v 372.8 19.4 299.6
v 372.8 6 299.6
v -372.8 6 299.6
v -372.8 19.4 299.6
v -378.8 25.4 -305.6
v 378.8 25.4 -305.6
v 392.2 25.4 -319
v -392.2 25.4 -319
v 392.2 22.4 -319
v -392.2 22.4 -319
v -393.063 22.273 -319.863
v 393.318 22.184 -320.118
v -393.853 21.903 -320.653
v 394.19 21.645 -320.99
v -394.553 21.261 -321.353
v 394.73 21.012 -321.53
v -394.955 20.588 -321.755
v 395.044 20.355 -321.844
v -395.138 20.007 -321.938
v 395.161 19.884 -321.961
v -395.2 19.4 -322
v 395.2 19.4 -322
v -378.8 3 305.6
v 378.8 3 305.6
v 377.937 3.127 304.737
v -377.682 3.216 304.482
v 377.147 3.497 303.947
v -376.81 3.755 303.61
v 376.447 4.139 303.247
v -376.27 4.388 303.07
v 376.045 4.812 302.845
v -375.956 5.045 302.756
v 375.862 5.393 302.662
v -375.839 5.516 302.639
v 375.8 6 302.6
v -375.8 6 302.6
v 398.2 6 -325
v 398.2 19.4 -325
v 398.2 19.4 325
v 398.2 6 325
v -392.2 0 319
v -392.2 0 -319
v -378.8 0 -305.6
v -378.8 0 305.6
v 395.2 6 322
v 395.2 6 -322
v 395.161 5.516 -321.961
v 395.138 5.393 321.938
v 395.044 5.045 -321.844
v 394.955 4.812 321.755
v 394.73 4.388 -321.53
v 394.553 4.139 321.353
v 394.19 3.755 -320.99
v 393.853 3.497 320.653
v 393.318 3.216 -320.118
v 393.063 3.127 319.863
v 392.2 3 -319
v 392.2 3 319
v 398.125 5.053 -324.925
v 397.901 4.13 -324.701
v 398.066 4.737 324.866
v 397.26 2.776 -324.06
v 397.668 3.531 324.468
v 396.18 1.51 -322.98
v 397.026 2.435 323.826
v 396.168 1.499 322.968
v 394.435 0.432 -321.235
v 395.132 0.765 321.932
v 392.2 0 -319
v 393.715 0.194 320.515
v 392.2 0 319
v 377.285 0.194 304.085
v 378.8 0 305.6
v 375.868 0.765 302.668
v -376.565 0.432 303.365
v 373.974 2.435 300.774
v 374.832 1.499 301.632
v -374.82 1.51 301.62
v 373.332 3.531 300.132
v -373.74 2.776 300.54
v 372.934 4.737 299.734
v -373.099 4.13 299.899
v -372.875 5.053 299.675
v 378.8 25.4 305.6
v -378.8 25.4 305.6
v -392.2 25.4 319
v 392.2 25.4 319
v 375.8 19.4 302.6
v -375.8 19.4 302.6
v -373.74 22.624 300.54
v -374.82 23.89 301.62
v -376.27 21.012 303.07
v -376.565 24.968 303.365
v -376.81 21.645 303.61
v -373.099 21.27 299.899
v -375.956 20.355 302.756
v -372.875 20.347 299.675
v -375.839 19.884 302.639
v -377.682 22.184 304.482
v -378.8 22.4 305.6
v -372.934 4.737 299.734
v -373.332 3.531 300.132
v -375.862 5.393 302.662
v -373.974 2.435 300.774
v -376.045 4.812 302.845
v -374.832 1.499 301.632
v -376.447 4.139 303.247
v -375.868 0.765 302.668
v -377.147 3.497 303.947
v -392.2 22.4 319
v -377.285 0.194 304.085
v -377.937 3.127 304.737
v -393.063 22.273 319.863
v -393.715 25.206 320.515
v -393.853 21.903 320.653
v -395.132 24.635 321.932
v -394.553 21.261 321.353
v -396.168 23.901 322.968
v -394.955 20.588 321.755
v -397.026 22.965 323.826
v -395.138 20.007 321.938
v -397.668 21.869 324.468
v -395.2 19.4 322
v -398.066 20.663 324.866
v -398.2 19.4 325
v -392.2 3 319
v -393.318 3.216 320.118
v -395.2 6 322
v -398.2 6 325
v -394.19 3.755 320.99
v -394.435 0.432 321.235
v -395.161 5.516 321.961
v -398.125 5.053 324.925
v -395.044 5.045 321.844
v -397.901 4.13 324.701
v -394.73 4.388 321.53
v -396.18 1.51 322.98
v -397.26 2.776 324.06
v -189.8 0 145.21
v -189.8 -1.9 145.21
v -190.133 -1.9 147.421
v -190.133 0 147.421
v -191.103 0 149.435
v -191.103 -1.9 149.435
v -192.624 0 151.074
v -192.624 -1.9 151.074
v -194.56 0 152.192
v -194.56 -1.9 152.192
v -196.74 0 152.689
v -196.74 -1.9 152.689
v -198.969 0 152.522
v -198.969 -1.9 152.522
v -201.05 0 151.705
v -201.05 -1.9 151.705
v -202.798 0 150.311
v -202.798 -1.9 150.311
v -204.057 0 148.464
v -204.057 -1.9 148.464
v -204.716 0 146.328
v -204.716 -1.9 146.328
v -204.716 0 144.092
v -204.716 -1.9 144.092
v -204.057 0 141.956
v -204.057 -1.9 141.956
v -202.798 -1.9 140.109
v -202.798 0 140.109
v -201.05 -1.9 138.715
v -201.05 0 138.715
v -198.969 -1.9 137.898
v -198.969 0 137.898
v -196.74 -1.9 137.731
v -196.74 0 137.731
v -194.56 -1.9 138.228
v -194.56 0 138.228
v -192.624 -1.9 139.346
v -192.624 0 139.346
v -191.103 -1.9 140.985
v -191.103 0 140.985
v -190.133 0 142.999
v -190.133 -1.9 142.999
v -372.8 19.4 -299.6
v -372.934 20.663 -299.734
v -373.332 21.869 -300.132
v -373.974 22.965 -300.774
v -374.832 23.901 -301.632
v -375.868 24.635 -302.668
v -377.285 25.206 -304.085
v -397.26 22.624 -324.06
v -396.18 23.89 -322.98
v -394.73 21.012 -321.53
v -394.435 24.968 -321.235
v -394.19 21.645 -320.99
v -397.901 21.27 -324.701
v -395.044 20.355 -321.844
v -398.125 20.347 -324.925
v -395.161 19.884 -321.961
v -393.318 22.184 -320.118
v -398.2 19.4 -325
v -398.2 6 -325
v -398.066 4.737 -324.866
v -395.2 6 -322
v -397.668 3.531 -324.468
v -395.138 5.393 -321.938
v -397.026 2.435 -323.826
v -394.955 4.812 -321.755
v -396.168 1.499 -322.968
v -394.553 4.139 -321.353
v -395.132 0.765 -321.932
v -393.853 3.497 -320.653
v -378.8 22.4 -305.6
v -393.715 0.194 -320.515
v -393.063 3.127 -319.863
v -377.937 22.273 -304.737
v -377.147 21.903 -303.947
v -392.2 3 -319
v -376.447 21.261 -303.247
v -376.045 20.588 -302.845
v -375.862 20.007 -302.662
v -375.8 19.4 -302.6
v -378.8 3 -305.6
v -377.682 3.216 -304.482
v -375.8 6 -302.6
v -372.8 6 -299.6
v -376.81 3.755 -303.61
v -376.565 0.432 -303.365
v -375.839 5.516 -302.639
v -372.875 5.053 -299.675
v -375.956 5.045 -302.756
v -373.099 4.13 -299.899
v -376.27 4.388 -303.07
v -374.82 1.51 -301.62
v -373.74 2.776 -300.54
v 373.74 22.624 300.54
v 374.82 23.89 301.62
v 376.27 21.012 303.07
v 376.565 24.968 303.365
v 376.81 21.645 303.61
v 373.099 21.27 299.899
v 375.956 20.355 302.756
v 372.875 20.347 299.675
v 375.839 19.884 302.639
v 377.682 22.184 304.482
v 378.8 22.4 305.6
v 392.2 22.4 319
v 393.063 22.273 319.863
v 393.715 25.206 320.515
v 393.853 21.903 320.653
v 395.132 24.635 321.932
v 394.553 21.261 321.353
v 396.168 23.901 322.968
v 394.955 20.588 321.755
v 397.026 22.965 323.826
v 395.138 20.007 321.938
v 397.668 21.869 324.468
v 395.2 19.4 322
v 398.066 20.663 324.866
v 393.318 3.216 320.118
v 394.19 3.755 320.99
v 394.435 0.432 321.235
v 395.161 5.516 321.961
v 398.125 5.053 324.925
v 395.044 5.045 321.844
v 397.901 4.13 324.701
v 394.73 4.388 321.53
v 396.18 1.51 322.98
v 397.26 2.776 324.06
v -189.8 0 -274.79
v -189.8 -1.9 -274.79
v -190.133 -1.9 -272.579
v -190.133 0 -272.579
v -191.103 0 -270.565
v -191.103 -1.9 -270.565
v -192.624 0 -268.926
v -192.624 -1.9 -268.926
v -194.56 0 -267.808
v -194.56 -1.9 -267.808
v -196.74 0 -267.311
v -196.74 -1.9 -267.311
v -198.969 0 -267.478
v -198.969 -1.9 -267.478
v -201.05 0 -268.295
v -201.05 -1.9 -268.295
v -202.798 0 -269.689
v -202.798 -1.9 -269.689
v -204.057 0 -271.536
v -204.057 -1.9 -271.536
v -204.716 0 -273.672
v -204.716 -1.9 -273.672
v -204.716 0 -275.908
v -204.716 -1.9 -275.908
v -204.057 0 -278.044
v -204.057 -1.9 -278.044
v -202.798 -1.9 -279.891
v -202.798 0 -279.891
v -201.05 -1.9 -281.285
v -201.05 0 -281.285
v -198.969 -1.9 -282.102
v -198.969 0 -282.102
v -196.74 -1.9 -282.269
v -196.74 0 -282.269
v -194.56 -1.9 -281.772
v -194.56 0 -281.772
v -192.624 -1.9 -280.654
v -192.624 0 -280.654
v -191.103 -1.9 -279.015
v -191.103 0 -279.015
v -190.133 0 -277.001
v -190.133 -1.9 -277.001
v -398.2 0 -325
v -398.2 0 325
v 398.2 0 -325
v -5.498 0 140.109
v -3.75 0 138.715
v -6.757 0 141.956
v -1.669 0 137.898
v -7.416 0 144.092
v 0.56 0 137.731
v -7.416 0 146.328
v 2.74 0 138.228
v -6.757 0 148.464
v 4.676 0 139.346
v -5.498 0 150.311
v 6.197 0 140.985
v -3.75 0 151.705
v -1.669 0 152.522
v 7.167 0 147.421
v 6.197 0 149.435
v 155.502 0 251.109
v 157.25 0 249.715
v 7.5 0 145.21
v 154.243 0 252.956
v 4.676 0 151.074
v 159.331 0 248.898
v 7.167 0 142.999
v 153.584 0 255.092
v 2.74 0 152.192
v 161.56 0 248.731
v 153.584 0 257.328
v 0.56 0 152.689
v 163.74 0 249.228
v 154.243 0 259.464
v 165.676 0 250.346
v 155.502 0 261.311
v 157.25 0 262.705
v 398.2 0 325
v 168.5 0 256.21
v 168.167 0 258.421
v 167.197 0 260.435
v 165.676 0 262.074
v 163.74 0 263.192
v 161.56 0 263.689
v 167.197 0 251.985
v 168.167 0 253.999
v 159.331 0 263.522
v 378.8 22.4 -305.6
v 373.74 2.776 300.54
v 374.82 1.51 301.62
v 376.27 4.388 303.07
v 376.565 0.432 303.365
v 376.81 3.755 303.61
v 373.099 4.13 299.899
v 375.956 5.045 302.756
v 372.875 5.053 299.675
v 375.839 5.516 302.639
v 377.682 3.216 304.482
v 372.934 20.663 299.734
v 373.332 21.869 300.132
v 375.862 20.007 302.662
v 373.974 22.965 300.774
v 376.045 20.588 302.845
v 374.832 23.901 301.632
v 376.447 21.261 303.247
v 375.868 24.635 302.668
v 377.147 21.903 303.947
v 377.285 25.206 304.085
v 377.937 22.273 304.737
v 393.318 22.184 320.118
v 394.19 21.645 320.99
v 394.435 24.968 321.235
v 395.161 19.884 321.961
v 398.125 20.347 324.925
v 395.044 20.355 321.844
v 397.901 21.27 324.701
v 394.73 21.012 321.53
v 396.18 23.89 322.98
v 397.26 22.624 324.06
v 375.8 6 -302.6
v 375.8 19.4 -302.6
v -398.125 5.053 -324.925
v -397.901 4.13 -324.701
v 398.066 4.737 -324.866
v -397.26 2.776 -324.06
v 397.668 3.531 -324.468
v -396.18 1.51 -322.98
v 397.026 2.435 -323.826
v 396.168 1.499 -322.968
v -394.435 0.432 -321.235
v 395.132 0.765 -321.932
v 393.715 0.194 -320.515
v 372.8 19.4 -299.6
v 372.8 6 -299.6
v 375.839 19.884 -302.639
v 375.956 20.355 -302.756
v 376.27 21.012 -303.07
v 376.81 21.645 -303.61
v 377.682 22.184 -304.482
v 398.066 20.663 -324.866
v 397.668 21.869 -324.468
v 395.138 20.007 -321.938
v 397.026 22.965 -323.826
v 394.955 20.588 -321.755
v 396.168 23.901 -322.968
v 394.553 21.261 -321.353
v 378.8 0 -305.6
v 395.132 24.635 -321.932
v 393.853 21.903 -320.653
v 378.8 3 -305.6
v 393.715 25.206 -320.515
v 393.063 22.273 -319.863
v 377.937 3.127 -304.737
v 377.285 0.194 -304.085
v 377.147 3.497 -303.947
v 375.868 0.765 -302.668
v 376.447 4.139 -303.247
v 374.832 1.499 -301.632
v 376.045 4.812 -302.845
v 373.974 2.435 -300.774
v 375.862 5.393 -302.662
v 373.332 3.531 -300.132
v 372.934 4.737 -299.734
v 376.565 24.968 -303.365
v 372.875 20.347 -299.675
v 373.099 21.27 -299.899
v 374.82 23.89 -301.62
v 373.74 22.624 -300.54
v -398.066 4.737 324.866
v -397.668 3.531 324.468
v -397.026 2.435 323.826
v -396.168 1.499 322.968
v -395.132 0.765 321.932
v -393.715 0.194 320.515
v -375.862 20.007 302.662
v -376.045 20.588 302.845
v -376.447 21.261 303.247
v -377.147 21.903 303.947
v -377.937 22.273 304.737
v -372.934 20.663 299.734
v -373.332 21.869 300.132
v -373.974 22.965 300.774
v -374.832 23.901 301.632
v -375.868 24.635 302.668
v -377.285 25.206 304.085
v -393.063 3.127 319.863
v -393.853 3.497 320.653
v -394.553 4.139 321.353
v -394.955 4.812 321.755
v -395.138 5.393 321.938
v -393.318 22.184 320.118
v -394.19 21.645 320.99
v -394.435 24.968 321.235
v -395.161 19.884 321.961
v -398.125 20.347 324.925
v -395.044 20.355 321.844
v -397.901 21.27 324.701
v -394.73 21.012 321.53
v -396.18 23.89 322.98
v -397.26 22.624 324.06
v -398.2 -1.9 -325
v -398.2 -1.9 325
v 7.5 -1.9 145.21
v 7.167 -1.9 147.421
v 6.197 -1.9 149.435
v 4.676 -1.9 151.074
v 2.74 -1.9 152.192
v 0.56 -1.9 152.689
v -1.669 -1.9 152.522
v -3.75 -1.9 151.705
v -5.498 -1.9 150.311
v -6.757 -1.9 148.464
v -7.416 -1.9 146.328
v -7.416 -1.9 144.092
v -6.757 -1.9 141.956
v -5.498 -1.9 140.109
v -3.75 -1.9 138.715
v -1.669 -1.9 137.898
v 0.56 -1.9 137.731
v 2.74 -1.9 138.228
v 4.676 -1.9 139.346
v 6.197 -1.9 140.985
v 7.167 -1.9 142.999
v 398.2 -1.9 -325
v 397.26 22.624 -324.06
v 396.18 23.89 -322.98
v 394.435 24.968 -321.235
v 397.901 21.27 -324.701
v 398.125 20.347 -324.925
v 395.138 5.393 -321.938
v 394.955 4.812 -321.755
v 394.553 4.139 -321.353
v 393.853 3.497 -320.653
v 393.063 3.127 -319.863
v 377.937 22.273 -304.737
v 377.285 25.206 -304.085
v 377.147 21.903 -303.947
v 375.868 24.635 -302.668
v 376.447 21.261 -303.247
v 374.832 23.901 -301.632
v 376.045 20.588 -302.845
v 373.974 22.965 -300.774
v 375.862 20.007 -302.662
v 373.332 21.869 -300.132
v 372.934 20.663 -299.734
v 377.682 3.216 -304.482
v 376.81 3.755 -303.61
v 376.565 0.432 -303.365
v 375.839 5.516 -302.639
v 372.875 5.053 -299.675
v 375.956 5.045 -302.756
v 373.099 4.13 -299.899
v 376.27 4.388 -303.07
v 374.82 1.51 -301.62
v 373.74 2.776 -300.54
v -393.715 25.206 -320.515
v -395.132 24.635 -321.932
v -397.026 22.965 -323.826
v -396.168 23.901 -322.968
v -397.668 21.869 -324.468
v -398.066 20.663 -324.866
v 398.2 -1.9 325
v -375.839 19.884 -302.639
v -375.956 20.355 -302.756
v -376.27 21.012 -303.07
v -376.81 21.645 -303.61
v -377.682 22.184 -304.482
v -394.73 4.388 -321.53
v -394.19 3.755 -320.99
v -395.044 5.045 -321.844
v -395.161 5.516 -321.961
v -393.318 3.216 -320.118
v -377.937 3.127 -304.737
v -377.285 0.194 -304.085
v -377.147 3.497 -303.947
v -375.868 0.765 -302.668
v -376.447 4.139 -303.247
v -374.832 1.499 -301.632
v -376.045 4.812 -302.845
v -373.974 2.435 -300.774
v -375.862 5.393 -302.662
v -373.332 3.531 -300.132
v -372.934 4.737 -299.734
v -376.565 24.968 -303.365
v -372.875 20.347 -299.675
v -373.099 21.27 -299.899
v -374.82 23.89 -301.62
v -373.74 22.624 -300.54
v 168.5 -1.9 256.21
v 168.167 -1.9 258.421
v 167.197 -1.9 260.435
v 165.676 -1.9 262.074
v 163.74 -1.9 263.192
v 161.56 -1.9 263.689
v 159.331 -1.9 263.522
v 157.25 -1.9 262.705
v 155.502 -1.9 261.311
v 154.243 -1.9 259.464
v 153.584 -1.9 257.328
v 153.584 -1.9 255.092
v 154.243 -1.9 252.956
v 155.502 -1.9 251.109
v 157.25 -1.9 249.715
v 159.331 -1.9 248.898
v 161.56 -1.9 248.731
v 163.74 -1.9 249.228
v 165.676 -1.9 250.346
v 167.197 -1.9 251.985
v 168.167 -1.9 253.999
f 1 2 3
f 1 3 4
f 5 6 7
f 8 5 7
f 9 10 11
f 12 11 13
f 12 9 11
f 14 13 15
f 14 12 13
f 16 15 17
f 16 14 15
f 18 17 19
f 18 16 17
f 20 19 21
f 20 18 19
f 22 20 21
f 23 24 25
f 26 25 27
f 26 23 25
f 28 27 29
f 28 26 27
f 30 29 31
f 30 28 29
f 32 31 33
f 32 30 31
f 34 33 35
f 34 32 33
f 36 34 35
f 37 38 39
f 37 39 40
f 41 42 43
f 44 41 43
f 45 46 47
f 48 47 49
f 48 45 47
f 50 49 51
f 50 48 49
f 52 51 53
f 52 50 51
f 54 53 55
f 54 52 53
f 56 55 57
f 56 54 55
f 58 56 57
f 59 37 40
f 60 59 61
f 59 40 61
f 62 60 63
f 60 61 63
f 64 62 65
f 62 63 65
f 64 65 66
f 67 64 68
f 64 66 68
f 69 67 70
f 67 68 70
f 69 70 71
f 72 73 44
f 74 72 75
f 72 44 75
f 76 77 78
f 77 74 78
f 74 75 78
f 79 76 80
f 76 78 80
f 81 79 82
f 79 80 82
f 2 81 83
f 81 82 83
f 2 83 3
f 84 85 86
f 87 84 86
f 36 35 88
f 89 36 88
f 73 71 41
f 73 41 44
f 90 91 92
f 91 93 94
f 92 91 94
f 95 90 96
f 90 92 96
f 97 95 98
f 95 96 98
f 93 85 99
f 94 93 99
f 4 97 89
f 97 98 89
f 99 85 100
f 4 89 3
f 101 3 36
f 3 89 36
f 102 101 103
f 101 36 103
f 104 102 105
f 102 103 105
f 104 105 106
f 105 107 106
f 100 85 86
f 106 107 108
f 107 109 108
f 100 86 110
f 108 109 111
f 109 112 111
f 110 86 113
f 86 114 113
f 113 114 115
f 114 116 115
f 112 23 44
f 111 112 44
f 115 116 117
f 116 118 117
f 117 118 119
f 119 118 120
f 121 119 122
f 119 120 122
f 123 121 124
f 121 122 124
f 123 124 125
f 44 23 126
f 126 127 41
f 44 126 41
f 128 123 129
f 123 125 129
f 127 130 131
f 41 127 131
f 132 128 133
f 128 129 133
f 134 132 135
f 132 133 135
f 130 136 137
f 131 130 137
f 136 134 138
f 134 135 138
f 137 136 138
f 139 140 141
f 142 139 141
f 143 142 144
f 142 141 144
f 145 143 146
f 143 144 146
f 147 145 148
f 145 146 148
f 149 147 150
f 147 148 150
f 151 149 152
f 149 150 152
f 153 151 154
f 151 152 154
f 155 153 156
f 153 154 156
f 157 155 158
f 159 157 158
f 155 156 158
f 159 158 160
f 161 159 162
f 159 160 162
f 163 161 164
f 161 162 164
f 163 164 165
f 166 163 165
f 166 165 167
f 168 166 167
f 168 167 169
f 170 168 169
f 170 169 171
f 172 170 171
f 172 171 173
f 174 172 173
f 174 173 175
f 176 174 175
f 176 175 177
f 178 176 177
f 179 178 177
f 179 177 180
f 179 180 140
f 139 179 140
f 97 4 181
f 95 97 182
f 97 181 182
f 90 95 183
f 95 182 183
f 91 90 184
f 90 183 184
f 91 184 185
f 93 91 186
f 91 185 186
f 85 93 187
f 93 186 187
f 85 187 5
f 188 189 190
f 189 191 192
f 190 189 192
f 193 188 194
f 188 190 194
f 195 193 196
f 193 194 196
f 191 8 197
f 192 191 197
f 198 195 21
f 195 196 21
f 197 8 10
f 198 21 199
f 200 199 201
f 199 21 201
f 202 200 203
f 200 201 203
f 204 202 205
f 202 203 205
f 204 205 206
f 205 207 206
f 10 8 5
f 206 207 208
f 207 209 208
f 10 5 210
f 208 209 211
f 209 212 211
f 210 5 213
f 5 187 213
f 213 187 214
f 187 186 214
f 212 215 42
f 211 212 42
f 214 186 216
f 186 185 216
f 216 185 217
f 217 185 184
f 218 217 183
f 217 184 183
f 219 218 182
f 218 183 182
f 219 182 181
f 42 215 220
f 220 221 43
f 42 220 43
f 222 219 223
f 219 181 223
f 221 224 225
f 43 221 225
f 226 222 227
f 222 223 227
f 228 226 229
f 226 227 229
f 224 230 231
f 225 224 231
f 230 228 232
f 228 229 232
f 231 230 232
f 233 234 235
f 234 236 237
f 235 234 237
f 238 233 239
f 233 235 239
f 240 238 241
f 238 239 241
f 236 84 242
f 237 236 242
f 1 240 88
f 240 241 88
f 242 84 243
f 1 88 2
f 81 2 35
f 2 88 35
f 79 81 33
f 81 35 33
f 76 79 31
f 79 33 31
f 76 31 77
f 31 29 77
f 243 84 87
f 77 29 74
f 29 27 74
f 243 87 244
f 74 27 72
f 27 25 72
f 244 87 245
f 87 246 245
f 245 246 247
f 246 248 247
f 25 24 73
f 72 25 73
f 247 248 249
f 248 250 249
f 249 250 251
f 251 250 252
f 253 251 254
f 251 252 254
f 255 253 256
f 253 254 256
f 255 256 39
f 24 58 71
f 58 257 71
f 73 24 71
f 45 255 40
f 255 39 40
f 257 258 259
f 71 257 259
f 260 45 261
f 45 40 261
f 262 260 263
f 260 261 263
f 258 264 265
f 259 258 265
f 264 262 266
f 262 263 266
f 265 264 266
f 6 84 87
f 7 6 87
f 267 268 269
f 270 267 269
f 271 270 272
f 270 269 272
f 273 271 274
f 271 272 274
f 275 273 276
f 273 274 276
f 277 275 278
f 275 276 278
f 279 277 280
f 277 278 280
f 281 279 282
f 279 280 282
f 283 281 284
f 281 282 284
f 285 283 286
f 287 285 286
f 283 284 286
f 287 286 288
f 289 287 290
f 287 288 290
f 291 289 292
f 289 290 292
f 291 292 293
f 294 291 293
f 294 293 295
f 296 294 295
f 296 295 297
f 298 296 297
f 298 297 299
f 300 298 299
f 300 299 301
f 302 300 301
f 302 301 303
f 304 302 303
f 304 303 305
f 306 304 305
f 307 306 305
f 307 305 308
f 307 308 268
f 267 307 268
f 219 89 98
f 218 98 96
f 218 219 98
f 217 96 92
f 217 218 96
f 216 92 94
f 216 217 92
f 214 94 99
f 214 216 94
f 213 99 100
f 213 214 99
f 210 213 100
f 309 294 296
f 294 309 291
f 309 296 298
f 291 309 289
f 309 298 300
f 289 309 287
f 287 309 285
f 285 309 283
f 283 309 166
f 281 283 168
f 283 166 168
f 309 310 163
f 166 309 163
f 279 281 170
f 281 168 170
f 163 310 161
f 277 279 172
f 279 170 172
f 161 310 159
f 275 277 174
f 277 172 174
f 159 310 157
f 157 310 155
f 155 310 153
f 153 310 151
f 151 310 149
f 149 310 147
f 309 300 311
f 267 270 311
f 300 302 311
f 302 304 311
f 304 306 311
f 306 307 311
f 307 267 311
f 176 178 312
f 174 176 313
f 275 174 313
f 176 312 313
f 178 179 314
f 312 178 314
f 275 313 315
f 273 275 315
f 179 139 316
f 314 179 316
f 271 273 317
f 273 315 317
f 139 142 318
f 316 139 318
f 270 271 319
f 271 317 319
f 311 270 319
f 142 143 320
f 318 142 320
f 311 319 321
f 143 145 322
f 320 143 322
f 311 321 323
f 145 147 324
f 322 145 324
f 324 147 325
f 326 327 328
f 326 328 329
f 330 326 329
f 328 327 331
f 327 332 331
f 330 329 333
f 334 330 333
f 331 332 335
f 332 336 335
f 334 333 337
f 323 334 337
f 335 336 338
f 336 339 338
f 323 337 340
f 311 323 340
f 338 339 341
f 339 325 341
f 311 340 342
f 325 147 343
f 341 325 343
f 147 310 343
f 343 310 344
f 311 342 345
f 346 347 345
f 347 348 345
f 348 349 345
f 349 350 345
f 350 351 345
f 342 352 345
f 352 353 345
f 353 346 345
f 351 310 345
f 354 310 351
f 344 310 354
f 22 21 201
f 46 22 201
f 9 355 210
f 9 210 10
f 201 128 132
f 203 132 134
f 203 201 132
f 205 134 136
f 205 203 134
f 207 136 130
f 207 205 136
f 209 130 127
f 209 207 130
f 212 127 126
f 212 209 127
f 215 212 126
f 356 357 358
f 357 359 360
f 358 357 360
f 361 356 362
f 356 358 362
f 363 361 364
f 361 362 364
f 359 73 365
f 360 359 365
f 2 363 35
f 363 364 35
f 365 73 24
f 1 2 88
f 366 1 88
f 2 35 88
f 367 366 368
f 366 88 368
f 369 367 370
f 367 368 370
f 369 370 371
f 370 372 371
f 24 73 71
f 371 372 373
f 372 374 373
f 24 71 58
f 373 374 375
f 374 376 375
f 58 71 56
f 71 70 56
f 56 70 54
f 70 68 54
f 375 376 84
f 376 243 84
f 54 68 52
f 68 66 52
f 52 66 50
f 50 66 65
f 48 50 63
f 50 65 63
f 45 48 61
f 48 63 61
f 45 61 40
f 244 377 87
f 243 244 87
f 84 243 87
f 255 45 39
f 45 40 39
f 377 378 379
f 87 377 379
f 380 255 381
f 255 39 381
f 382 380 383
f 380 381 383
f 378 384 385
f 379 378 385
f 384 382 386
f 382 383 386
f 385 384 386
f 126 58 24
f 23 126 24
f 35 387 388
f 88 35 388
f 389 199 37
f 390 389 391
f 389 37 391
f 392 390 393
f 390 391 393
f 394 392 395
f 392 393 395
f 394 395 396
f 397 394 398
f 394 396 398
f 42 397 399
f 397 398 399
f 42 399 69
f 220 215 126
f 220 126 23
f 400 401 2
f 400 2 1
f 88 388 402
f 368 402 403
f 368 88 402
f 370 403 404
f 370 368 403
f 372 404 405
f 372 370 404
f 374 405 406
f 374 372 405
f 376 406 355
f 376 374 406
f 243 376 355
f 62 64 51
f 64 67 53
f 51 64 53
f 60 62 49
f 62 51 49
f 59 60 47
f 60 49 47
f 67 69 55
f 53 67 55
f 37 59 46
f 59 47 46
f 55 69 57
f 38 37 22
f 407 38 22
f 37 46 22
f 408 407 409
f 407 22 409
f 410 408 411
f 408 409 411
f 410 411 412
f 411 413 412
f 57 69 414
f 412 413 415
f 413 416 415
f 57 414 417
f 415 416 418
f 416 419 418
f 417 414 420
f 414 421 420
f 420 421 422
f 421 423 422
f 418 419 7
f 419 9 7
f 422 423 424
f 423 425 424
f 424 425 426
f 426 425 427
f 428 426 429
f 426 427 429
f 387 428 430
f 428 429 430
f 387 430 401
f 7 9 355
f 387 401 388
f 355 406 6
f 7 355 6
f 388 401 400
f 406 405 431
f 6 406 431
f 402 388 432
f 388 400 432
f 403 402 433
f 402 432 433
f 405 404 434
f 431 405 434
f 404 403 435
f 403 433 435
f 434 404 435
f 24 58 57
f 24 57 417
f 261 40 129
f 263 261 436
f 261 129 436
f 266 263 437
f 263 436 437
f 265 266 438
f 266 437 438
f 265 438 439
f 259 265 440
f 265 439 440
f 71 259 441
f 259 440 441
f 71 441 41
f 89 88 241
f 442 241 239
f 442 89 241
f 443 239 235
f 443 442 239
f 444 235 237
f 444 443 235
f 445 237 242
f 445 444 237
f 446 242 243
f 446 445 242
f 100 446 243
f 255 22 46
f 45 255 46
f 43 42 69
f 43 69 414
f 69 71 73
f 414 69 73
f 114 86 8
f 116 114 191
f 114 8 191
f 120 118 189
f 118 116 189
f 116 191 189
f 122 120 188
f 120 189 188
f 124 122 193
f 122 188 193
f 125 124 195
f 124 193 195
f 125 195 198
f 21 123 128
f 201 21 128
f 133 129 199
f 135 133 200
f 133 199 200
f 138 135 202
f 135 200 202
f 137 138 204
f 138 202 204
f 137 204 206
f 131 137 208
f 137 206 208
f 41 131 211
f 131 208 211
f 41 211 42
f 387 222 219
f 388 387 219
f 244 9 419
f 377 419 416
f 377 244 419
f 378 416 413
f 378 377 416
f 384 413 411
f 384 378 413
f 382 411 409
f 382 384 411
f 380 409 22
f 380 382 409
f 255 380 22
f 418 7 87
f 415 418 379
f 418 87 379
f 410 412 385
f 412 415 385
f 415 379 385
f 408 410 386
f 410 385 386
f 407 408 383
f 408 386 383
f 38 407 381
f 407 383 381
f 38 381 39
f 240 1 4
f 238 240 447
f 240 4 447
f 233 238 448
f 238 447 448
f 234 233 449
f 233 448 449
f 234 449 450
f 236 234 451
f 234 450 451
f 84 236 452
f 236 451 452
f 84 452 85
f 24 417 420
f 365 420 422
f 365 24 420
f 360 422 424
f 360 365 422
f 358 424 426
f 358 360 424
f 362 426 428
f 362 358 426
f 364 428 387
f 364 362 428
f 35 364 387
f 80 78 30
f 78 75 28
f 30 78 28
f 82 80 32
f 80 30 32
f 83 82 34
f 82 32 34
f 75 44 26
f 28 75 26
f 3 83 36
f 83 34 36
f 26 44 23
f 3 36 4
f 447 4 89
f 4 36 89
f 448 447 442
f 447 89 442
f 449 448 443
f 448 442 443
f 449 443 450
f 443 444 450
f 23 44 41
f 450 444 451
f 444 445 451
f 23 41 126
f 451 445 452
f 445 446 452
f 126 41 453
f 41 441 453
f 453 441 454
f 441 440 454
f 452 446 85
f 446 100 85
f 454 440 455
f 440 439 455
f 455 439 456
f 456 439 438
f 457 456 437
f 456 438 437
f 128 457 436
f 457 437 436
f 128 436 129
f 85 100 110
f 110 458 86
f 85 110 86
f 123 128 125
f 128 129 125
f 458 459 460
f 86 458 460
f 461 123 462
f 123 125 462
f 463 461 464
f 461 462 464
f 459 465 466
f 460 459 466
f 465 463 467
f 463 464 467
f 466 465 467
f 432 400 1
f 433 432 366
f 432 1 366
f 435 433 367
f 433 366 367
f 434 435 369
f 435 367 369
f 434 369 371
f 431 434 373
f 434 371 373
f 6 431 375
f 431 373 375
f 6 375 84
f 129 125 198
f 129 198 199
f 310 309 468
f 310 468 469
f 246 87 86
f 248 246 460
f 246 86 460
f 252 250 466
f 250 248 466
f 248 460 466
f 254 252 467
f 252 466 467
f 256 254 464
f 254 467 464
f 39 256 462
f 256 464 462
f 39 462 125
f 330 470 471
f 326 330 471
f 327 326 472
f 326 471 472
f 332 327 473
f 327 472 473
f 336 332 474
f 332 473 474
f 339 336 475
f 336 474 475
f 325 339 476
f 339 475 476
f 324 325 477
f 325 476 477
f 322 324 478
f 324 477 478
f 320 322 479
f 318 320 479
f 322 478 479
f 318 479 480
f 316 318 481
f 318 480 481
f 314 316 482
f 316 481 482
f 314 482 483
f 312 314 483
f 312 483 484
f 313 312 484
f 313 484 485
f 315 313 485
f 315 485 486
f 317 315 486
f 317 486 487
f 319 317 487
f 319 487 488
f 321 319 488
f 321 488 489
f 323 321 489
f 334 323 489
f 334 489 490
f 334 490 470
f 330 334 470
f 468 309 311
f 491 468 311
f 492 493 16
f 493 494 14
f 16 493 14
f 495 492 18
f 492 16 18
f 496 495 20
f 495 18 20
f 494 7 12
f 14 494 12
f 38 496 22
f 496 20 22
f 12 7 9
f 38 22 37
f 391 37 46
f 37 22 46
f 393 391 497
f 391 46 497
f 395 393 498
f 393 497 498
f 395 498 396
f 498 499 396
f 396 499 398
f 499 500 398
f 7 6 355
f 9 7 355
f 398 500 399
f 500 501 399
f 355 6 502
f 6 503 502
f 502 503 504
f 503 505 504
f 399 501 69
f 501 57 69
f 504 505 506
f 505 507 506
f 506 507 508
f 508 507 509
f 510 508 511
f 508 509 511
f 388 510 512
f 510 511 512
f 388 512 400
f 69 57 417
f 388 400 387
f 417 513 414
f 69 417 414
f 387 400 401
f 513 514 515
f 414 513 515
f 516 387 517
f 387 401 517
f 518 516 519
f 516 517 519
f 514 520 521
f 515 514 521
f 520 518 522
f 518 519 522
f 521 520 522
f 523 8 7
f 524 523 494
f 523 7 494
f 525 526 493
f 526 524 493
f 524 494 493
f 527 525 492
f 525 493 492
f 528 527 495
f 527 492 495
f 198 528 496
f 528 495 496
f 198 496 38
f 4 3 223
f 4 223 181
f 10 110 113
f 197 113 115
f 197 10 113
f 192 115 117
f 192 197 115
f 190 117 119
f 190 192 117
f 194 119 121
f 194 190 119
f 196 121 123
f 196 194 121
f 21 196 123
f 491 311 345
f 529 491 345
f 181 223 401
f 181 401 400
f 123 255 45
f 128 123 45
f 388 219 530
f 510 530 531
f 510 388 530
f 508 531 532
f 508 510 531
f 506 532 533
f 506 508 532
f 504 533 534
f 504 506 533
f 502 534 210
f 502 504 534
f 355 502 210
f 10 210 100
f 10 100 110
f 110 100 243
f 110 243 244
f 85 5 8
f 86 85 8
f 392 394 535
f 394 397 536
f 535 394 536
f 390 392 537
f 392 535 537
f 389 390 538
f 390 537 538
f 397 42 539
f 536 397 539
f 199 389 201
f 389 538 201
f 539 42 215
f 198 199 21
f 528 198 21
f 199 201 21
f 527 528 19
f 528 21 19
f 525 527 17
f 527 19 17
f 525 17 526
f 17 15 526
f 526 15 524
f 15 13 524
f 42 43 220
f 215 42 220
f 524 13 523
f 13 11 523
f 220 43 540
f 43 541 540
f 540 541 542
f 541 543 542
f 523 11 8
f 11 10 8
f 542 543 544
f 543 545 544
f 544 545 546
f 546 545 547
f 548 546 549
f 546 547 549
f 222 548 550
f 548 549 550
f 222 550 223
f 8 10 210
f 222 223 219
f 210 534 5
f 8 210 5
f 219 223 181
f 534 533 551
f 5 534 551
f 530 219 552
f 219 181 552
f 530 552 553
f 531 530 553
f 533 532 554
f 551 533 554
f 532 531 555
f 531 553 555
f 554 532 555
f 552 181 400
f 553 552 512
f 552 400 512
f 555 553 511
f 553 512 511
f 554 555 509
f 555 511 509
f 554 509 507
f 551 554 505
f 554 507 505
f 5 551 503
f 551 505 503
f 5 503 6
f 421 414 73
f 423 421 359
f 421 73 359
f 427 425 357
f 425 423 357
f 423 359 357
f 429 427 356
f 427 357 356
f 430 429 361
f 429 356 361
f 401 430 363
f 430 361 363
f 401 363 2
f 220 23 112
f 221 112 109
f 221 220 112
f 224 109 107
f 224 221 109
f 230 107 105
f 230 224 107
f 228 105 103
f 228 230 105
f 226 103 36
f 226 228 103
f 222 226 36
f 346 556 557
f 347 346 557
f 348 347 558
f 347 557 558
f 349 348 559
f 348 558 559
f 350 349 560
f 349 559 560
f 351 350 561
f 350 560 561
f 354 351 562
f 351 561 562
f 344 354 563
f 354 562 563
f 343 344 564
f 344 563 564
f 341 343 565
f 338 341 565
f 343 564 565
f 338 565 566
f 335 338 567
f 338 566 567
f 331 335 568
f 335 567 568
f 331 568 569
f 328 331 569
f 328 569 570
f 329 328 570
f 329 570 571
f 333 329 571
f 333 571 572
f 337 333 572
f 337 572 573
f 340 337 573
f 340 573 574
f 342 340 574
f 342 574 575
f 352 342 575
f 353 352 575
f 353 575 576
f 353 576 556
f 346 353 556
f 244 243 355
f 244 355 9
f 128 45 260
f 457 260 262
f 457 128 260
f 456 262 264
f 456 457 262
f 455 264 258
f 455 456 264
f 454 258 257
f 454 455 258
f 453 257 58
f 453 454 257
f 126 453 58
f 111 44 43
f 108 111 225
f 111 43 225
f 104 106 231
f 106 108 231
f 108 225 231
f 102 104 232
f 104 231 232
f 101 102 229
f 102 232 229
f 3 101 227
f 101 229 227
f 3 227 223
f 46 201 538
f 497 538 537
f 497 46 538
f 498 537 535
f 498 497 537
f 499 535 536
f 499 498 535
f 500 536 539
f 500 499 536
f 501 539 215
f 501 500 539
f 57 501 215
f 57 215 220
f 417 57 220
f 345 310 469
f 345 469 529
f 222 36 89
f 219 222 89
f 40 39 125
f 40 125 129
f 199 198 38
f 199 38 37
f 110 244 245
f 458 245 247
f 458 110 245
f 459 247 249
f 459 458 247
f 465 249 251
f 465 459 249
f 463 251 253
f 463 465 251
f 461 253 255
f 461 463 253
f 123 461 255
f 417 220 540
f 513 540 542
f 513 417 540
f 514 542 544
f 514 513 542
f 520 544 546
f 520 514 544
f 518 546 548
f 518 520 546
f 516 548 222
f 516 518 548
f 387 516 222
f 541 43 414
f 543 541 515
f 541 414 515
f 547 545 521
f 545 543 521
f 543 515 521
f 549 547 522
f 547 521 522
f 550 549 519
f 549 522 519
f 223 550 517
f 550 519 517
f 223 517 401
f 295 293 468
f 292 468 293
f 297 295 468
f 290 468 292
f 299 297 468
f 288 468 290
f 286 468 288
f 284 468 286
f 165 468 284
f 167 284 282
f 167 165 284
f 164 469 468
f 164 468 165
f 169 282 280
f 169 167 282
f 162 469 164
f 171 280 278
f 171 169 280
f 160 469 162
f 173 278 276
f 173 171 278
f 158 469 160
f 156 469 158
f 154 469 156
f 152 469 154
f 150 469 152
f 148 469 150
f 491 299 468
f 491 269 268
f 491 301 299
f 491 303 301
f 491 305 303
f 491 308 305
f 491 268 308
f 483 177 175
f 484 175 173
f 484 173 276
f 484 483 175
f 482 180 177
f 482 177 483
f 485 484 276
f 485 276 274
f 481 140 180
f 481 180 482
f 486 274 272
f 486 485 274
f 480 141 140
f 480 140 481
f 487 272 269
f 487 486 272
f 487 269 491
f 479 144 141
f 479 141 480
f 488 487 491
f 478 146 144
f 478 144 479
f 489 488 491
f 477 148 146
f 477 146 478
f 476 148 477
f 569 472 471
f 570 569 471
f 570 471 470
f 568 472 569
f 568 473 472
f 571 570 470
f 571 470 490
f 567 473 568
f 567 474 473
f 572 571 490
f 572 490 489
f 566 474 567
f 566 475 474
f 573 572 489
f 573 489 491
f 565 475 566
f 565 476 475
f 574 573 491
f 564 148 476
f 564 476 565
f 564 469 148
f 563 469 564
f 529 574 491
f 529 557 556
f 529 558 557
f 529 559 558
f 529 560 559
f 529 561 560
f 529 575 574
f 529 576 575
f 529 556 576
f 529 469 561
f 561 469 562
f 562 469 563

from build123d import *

# Parameters (mm, degrees)
TUBO_CUADRADO_2_X_2_X_0_25_1_DEPTH      = 686.921024484
TUBO_CUADRADO_2_X_2_X_0_25_1_DEPTH_BACK = 36.921024484
TUBO_CUADRADO_2_X_2_X_0_25_1_2_DEPTH    = 870.242048969
TUBO_CUADRADO_2_X_2_X_0_25_1_3_DEPTH    = 723.842048969
TUBO_CUADRADO_2_X_2_X_0_25_1_4_DEPTH    = 870.242048969
CROQUIS3_W                              = 796.4
CROQUIS3_H                              = 650
SALIENTE_EXTRUIR1_DEPTH                 = 1.9
CROQUIS7_R                              = 7.5
CORTAR_EXTRUIR1_DEPTH                   = 10


with BuildPart() as part:
    # Sketch1 → Tubo cuadrado 2 X 2 X 0.25(1) (new, two sides: drawn at the far end of the back side and taken through both)
    with BuildSketch(Plane(origin=(-385.5, 12.7, -325), x_dir=(1, 0, 0), z_dir=(0, 0, 1)).offset(-TUBO_CUADRADO_2_X_2_X_0_25_1_DEPTH_BACK)):
        with BuildLine():
            Line((-6.7, -12.7), (6.7, -12.7))
            ThreePointArc((6.7, -12.7), (10.942640687, -10.942640687), (12.7, -6.7))
            Line((12.7, -6.7), (12.7, 6.7))
            ThreePointArc((12.7, 6.7), (10.942640687, 10.942640687), (6.7, 12.7))
            Line((6.7, 12.7), (-6.7, 12.7))
            ThreePointArc((-6.7, 12.7), (-10.942640687, 10.942640687), (-12.7, 6.7))
            Line((-12.7, 6.7), (-12.7, -6.7))
            ThreePointArc((-12.7, -6.7), (-10.942640687, -10.942640687), (-6.7, -12.7))
        make_face()
        with BuildLine():
            Line((-6.7, -9.7), (6.7, -9.7))
            ThreePointArc((6.7, -9.7), (8.821320344, -8.821320344), (9.7, -6.7))
            Line((9.7, -6.7), (9.7, 6.7))
            ThreePointArc((9.7, 6.7), (8.821320344, 8.821320344), (6.7, 9.7))
            Line((6.7, 9.7), (-6.7, 9.7))
            ThreePointArc((-6.7, 9.7), (-8.821320344, 8.821320344), (-9.7, 6.7))
            Line((-9.7, 6.7), (-9.7, -6.7))
            ThreePointArc((-9.7, -6.7), (-8.821320344, -8.821320344), (-6.7, -9.7))
        make_face(mode=Mode.SUBTRACT)
    extrude(amount=TUBO_CUADRADO_2_X_2_X_0_25_1_DEPTH + TUBO_CUADRADO_2_X_2_X_0_25_1_DEPTH_BACK)

    # Tubo cuadrado 2 X 2 X 0.25(1) mitre 1
    split(bisect_by=Plane(origin=(-398.2, 0, -325), x_dir=(0, -1, 0), z_dir=(-0.707106781, 0, 0.707106781)), keep=Keep.TOP)

    # Tubo cuadrado 2 X 2 X 0.25(1) mitre 2
    split(bisect_by=Plane(origin=(-398.2, 0, 325), x_dir=(0, -1, 0), z_dir=(-0.707106781, 0, -0.707106781)), keep=Keep.TOP)


with BuildPart() as body_2:
    # Sketch1 on segment 2 (carried to segment 2) → Tubo cuadrado 2 X 2 X 0.25_1 2 (new body)
    with BuildSketch(Plane(origin=(-435.121024484, 12.7, 312.3), x_dir=(0, 0, -1), z_dir=(1, 0, 0))):
        with BuildLine():
            Line((-6.7, -12.7), (6.7, -12.7))
            ThreePointArc((6.7, -12.7), (10.942640687, -10.942640687), (12.7, -6.7))
            Line((12.7, -6.7), (12.7, 6.7))
            ThreePointArc((12.7, 6.7), (10.942640687, 10.942640687), (6.7, 12.7))
            Line((6.7, 12.7), (-6.7, 12.7))
            ThreePointArc((-6.7, 12.7), (-10.942640687, 10.942640687), (-12.7, 6.7))
            Line((-12.7, 6.7), (-12.7, -6.7))
            ThreePointArc((-12.7, -6.7), (-10.942640687, -10.942640687), (-6.7, -12.7))
        make_face()
        with BuildLine():
            Line((-6.7, -9.7), (6.7, -9.7))
            ThreePointArc((6.7, -9.7), (8.821320344, -8.821320344), (9.7, -6.7))
            Line((9.7, -6.7), (9.7, 6.7))
            ThreePointArc((9.7, 6.7), (8.821320344, 8.821320344), (6.7, 9.7))
            Line((6.7, 9.7), (-6.7, 9.7))
            ThreePointArc((-6.7, 9.7), (-8.821320344, 8.821320344), (-9.7, 6.7))
            Line((-9.7, 6.7), (-9.7, -6.7))
            ThreePointArc((-9.7, -6.7), (-8.821320344, -8.821320344), (-6.7, -9.7))
        make_face(mode=Mode.SUBTRACT)
    extrude(amount=TUBO_CUADRADO_2_X_2_X_0_25_1_2_DEPTH)

    # Tubo cuadrado 2 X 2 X 0.25_1 2 mitre 1
    split(bisect_by=Plane(origin=(-398.2, 0, 325), x_dir=(0, 1, 0), z_dir=(0.707106781, 0, 0.707106781)), keep=Keep.TOP)

    # Tubo cuadrado 2 X 2 X 0.25_1 2 mitre 2
    split(bisect_by=Plane(origin=(398.2, 0, 325), x_dir=(0, -1, 0), z_dir=(-0.707106781, 0, 0.707106781)), keep=Keep.TOP)


with BuildPart() as body_3:
    # Sketch1 on segment 3 (carried to segment 3) → Tubo cuadrado 2 X 2 X 0.25_1 3 (new body)
    with BuildSketch(Plane(origin=(385.5, 12.7, 361.921024484), x_dir=(-1, 0, 0), z_dir=(0, 0, -1))):
        with BuildLine():
            Line((-6.7, -12.7), (6.7, -12.7))
            ThreePointArc((6.7, -12.7), (10.942640687, -10.942640687), (12.7, -6.7))
            Line((12.7, -6.7), (12.7, 6.7))
            ThreePointArc((12.7, 6.7), (10.942640687, 10.942640687), (6.7, 12.7))
            Line((6.7, 12.7), (-6.7, 12.7))
            ThreePointArc((-6.7, 12.7), (-10.942640687, 10.942640687), (-12.7, 6.7))
            Line((-12.7, 6.7), (-12.7, -6.7))
            ThreePointArc((-12.7, -6.7), (-10.942640687, -10.942640687), (-6.7, -12.7))
        make_face()
        with BuildLine():
            Line((-6.7, -9.7), (6.7, -9.7))
            ThreePointArc((6.7, -9.7), (8.821320344, -8.821320344), (9.7, -6.7))
            Line((9.7, -6.7), (9.7, 6.7))
            ThreePointArc((9.7, 6.7), (8.821320344, 8.821320344), (6.7, 9.7))
            Line((6.7, 9.7), (-6.7, 9.7))
            ThreePointArc((-6.7, 9.7), (-8.821320344, 8.821320344), (-9.7, 6.7))
            Line((-9.7, 6.7), (-9.7, -6.7))
            ThreePointArc((-9.7, -6.7), (-8.821320344, -8.821320344), (-6.7, -9.7))
        make_face(mode=Mode.SUBTRACT)
    extrude(amount=TUBO_CUADRADO_2_X_2_X_0_25_1_3_DEPTH)

    # Tubo cuadrado 2 X 2 X 0.25_1 3 mitre 1
    split(bisect_by=Plane(origin=(398.2, 0, -325), x_dir=(0, 1, 0), z_dir=(0.707106781, 0, 0.707106781)), keep=Keep.TOP)

    # Tubo cuadrado 2 X 2 X 0.25_1 3 mitre 2
    split(bisect_by=Plane(origin=(398.2, 0, 325), x_dir=(0, 1, 0), z_dir=(0.707106781, 0, -0.707106781)), keep=Keep.TOP)


with BuildPart() as body_4:
    # Sketch1 on segment 4 (carried to segment 4) → Tubo cuadrado 2 X 2 X 0.25_1 4 (new body)
    with BuildSketch(Plane(origin=(435.121024484, 12.7, -312.3), x_dir=(0, 0, 1), z_dir=(-1, 0, 0))):
        with BuildLine():
            Line((-6.7, -12.7), (6.7, -12.7))
            ThreePointArc((6.7, -12.7), (10.942640687, -10.942640687), (12.7, -6.7))
            Line((12.7, -6.7), (12.7, 6.7))
            ThreePointArc((12.7, 6.7), (10.942640687, 10.942640687), (6.7, 12.7))
            Line((6.7, 12.7), (-6.7, 12.7))
            ThreePointArc((-6.7, 12.7), (-10.942640687, 10.942640687), (-12.7, 6.7))
            Line((-12.7, 6.7), (-12.7, -6.7))
            ThreePointArc((-12.7, -6.7), (-10.942640687, -10.942640687), (-6.7, -12.7))
        make_face()
        with BuildLine():
            Line((-6.7, -9.7), (6.7, -9.7))
            ThreePointArc((6.7, -9.7), (8.821320344, -8.821320344), (9.7, -6.7))
            Line((9.7, -6.7), (9.7, 6.7))
            ThreePointArc((9.7, 6.7), (8.821320344, 8.821320344), (6.7, 9.7))
            Line((6.7, 9.7), (-6.7, 9.7))
            ThreePointArc((-6.7, 9.7), (-8.821320344, 8.821320344), (-9.7, 6.7))
            Line((-9.7, 6.7), (-9.7, -6.7))
            ThreePointArc((-9.7, -6.7), (-8.821320344, -8.821320344), (-6.7, -9.7))
        make_face(mode=Mode.SUBTRACT)
    extrude(amount=TUBO_CUADRADO_2_X_2_X_0_25_1_4_DEPTH)

    # Tubo cuadrado 2 X 2 X 0.25_1 4 mitre 1
    split(bisect_by=Plane(origin=(-398.2, 0, -325), x_dir=(0, 1, 0), z_dir=(0.707106781, 0, -0.707106781)), keep=Keep.TOP)

    # Tubo cuadrado 2 X 2 X 0.25_1 4 mitre 2
    split(bisect_by=Plane(origin=(398.2, 0, -325), x_dir=(0, -1, 0), z_dir=(-0.707106781, 0, -0.707106781)), keep=Keep.TOP)


with BuildPart() as body_5:
    # Croquis3 → Saliente-Extruir1 (new body)
    with BuildSketch(Plane.XZ):
        Rectangle(CROQUIS3_W, CROQUIS3_H)
    extrude(amount=SALIENTE_EXTRUIR1_DEPTH)

    # Croquis7 → Cortar-Extruir1 (cut)
    with BuildSketch(Plane.XZ.offset(1.9)):
        with Locations((0, 145.21)):
            Circle(CROQUIS7_R)
        with Locations((161, 256.21)):
            Circle(CROQUIS7_R)
        with Locations((-197.3, 145.21)):
            Circle(CROQUIS7_R)
        with Locations((-197.3, -274.79)):
            Circle(CROQUIS7_R)
    extrude(amount=-CORTAR_EXTRUIR1_DEPTH, mode=Mode.SUBTRACT)


solid = Compound([part.part, body_2.part, body_3.part, body_4.part, body_5.part])
